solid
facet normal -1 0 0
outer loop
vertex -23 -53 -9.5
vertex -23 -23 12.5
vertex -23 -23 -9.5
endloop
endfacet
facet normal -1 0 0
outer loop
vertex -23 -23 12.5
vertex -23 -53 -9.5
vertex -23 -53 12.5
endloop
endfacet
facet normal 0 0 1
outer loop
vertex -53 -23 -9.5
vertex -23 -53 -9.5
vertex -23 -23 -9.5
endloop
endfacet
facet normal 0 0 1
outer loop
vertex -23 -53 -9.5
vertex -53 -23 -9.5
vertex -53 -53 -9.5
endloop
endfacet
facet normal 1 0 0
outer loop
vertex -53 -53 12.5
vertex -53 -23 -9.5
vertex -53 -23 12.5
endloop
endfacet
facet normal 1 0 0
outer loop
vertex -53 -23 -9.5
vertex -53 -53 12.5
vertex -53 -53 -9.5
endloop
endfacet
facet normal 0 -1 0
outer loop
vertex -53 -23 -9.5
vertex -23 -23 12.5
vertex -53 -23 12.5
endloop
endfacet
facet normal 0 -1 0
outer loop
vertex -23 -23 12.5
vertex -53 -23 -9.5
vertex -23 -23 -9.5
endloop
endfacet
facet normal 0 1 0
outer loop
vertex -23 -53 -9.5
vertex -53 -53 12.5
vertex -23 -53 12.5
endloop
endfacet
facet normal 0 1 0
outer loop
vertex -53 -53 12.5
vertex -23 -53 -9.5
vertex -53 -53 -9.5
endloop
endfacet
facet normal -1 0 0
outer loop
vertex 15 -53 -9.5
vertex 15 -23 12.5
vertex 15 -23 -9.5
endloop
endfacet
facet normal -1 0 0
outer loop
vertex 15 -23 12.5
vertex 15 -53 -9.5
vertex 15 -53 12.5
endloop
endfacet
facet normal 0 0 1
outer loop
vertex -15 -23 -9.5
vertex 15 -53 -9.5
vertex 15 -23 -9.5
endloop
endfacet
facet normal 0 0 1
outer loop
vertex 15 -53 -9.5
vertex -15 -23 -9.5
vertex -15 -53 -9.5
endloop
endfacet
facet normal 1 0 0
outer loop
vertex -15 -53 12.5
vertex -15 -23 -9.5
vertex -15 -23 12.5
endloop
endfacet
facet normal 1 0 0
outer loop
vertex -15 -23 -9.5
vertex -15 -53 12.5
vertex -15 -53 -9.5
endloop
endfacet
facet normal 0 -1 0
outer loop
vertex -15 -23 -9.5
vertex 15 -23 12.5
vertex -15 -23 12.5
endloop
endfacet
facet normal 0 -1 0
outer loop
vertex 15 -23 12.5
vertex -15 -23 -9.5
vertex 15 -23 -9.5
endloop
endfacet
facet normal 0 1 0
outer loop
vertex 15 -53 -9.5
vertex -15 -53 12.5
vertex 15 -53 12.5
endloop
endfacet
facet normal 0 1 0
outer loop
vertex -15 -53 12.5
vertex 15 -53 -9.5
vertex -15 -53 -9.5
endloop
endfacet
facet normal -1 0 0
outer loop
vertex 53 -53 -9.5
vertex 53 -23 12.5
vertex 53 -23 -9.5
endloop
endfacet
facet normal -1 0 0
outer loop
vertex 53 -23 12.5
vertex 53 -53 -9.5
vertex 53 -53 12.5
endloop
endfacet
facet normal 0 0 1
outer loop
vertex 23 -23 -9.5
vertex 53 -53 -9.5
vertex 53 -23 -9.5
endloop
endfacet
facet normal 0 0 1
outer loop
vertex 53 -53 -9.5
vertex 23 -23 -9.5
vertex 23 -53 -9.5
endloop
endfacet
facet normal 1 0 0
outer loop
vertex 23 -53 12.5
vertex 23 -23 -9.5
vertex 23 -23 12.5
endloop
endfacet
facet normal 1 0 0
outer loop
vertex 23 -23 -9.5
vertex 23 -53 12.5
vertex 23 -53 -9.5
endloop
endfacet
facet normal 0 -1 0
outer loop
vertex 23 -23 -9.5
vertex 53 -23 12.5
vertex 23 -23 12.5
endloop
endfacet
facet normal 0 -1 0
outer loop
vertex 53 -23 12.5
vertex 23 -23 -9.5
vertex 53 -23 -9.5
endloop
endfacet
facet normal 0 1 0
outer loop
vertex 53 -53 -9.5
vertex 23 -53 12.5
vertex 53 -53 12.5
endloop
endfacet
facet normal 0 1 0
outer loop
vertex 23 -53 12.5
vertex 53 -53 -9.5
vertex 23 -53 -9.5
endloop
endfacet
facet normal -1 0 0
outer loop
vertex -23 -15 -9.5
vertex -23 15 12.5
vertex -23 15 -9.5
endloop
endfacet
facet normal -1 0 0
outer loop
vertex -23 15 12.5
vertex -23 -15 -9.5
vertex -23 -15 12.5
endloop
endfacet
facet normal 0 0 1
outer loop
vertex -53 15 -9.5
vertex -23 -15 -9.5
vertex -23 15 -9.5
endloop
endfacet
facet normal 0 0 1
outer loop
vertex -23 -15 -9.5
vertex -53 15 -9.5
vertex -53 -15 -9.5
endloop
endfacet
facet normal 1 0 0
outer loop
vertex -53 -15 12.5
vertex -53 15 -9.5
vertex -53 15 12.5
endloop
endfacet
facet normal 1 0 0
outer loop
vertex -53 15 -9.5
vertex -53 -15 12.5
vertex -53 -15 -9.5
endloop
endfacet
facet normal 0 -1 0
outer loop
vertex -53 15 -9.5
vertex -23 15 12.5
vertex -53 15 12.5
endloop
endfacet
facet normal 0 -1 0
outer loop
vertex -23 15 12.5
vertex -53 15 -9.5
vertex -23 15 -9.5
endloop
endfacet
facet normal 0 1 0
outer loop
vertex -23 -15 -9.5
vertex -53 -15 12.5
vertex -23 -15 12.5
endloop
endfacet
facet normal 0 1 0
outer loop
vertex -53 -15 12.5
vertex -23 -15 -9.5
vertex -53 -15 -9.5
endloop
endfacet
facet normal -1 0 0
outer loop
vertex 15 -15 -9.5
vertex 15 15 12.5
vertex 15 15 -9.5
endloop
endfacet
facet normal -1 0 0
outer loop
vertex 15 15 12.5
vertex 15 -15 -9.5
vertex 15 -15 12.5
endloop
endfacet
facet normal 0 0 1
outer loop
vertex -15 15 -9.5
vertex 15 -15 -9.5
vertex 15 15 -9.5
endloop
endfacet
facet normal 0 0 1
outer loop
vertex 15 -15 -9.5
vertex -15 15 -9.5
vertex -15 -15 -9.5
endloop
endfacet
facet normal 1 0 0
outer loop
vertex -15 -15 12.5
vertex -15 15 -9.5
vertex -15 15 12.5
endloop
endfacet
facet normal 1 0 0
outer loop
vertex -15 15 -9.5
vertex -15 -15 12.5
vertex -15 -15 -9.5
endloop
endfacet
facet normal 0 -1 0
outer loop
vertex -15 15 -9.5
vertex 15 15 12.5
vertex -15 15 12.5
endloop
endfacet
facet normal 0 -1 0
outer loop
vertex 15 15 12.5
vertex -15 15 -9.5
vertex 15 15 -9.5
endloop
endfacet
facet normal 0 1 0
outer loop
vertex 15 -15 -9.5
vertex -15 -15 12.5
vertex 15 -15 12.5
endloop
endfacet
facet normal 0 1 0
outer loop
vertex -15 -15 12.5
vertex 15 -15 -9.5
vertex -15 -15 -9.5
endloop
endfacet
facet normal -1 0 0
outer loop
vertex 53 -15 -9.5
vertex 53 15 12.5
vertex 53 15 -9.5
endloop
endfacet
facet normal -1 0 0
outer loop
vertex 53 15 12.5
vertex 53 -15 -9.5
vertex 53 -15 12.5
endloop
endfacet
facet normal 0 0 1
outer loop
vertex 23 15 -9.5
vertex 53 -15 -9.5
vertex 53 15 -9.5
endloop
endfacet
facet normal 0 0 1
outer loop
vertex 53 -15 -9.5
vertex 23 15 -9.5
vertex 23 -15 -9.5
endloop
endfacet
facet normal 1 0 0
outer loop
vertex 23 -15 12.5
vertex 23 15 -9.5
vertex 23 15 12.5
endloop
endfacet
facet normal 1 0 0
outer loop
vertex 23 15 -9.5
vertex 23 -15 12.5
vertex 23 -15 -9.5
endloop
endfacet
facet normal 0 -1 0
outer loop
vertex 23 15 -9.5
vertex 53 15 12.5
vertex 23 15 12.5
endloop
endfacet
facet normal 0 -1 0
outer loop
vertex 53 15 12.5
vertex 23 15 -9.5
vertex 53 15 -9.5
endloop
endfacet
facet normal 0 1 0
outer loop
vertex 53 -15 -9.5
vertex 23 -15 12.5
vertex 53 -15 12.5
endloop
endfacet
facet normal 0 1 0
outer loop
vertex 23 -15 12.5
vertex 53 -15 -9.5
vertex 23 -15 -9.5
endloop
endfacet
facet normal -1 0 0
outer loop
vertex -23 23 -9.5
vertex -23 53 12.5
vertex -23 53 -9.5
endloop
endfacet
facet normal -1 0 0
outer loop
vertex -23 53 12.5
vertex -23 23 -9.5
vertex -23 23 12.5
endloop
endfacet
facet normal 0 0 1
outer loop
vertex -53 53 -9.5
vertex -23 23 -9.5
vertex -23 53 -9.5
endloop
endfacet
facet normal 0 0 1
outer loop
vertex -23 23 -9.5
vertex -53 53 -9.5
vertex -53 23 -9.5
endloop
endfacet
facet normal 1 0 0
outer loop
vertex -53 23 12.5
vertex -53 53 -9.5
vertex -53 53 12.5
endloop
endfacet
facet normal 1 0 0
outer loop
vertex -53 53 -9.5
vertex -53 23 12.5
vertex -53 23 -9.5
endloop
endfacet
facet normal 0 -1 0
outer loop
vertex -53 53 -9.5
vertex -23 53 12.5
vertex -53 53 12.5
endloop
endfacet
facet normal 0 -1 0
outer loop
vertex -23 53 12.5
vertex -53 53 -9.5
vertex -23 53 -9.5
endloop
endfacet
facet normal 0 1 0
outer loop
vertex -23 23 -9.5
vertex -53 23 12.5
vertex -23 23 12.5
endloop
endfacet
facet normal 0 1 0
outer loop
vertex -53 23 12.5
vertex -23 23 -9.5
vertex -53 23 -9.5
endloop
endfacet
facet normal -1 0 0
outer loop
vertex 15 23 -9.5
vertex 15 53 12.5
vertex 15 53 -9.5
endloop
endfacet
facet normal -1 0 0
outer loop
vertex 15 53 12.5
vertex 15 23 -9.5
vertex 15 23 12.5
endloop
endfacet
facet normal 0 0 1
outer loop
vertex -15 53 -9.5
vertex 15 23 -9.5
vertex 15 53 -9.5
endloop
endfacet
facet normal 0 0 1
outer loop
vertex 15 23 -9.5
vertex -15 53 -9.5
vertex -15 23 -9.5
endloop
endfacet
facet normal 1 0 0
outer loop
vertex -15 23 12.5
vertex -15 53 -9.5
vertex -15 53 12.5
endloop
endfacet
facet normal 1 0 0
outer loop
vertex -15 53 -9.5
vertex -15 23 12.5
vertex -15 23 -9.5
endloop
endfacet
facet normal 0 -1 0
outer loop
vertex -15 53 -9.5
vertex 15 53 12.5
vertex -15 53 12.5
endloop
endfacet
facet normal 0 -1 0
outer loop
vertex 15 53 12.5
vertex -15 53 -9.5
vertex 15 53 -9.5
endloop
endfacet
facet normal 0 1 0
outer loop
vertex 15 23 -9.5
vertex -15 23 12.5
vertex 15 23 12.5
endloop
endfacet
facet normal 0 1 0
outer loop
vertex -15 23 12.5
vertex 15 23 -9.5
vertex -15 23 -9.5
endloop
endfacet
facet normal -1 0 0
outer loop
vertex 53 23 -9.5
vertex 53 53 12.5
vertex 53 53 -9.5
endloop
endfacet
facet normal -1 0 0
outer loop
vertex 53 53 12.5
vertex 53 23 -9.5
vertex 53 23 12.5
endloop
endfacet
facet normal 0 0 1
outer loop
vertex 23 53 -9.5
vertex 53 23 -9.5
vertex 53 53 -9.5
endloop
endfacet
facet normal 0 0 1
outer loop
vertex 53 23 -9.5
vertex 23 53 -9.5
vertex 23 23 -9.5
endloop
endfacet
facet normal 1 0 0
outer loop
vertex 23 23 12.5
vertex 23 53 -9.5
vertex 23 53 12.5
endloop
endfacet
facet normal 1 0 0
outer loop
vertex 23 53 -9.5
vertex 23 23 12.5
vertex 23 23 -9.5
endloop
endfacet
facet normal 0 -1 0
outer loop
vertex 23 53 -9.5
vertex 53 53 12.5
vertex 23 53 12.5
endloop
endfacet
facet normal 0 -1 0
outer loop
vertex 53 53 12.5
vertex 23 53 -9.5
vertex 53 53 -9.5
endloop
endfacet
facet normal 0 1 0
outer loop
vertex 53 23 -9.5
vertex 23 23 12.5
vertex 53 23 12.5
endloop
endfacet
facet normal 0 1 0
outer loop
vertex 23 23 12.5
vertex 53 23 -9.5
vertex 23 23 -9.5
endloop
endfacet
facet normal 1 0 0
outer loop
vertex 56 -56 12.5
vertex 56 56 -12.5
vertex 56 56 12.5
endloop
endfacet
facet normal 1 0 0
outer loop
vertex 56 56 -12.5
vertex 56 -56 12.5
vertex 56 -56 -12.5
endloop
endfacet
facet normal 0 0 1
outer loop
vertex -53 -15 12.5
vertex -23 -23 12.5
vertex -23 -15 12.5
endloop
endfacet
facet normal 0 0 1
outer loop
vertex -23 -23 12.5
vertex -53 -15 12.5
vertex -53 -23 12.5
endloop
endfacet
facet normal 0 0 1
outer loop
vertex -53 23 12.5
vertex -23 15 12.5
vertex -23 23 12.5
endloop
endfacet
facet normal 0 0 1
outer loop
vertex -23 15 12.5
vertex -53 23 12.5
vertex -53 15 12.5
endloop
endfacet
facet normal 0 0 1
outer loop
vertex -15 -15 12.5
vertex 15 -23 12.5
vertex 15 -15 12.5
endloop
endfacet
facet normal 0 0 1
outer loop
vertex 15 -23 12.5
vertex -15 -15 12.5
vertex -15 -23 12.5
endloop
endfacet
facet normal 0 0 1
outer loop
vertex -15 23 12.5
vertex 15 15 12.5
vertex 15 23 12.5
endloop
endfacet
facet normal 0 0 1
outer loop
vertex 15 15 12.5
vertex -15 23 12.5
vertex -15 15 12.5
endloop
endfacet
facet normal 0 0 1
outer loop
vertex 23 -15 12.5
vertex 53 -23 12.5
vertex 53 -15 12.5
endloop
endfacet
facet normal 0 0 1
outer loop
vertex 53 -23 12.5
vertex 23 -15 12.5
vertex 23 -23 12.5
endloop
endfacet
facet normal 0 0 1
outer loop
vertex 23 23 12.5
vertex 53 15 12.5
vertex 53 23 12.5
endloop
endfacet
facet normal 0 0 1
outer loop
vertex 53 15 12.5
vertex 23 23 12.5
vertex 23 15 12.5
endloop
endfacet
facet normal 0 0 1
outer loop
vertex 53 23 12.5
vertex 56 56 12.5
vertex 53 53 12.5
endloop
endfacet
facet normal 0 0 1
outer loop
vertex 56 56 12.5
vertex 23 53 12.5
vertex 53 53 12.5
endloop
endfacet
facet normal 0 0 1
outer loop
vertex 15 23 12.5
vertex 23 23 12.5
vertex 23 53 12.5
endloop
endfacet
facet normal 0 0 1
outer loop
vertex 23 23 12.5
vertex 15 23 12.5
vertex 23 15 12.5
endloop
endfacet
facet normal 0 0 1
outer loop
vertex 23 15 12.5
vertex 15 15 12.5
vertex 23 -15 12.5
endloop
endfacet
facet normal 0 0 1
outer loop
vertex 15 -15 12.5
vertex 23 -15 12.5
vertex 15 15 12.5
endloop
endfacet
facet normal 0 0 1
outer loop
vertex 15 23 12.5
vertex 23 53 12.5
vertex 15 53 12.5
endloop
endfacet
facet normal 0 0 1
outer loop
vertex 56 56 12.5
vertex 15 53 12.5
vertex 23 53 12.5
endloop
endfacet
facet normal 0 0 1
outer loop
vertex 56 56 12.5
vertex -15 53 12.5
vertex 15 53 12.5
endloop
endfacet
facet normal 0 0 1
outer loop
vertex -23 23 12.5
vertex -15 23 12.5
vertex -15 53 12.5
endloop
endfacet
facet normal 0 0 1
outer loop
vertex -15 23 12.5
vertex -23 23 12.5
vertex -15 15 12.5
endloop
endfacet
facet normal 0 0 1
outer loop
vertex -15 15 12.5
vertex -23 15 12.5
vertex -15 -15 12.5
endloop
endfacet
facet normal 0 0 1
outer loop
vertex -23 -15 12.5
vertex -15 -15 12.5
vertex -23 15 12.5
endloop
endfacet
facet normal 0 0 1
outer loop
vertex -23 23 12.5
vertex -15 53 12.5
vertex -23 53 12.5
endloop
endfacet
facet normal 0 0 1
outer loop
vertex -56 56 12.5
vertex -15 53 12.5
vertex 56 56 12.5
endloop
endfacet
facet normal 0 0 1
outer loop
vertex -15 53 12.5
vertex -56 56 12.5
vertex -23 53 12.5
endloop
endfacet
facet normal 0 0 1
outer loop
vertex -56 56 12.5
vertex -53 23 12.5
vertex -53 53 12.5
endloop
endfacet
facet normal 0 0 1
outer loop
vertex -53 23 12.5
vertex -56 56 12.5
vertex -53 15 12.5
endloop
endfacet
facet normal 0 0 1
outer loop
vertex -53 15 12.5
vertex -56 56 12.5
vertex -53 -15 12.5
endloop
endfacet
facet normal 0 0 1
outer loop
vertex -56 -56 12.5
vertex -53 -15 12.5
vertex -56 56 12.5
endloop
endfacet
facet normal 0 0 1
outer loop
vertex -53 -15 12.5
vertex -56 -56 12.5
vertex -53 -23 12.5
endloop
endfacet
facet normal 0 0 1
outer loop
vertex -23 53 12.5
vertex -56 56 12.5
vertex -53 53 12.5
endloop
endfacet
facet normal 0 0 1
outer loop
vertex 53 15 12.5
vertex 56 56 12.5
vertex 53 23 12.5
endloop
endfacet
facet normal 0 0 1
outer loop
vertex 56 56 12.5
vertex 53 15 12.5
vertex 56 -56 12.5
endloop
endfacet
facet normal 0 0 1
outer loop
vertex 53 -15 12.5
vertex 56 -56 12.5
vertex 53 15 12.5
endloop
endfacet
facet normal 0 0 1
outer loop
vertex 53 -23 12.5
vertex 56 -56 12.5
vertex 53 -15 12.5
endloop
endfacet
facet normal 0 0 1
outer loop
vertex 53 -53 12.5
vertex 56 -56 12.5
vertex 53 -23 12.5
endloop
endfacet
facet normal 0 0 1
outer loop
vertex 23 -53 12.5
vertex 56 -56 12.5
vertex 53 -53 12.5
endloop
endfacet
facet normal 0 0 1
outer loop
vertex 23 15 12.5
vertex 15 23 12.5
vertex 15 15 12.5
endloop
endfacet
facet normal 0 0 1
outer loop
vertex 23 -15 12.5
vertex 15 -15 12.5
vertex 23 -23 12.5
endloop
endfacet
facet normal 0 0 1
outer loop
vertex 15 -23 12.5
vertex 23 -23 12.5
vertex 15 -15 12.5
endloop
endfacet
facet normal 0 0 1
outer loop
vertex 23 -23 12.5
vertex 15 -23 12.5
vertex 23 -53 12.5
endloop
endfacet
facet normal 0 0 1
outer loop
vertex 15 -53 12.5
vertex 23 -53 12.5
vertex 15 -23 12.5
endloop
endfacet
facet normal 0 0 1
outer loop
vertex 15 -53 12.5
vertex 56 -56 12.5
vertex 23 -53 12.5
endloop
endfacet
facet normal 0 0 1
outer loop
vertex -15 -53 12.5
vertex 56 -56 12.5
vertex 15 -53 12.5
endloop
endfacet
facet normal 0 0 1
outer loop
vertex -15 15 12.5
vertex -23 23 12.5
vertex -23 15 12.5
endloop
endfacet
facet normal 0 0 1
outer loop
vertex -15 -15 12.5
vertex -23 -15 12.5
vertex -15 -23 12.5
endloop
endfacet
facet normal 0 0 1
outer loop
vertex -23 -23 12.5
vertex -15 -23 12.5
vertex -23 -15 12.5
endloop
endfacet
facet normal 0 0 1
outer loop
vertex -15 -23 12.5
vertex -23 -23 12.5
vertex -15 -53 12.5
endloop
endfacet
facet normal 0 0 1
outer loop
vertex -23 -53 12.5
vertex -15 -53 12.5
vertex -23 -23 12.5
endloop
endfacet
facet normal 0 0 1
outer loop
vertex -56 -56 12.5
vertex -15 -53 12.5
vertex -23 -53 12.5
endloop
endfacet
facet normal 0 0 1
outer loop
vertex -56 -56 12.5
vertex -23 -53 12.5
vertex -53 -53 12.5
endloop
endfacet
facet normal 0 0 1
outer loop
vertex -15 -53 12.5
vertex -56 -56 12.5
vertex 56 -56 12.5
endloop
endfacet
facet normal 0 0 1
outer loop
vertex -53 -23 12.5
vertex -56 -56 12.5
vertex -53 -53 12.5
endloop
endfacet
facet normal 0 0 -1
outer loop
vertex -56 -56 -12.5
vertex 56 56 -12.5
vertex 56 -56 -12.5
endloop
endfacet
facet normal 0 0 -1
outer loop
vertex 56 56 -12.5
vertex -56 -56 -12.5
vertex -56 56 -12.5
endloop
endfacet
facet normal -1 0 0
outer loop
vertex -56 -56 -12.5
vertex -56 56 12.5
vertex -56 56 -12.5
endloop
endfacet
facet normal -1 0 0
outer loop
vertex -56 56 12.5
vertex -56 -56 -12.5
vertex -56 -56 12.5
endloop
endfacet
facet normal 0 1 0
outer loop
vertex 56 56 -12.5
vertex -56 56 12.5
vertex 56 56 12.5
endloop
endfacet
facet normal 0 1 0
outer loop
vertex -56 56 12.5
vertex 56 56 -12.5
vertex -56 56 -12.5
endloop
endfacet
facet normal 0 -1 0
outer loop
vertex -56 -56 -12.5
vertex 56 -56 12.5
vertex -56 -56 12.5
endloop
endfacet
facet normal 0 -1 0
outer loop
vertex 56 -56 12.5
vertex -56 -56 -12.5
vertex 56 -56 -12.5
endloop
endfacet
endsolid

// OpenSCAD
$fn = 32;

// ----------------------------------------------------------------------
// Pocket plate 112 x 112 x 25
// 3 x 3 pockets 30 mm square, 22 mm deep
// ----------------------------------------------------------------------

// --- parameters (mm) ---
thickness = 25;  // plate thickness
floor_t = 3;     // material left under each pocket
pocket = 30;     // pocket side length
pitch_x = 38;    // pocket pitch along X
pitch_y = 38;    // pocket pitch along Y
cols = 3;        // pockets per row
rows = 3;        // rows of pockets

// --- derived feature positions (mm) ---
depth = thickness - floor_t;        // = 22   pocket depth, down to the floor
span_x = (cols - 1) * pitch_x;      // = 76   distance between outer pockets
span_y = (rows - 1) * pitch_y;      // = 76   distance between outer pocket rows
origin_x = -span_x / 2;             // = -38   X of the first pocket
origin_y = -span_y / 2;             // = -38   Y of the first pocket
plate = [span_x + pocket + 6, span_y + pocket + 6, thickness];  // = [112, 112, 25]   overall size: pockets plus 3 mm of wall on each side
feature_centers = [
  [origin_x + 0 * pitch_x, origin_y + 0 * pitch_y],
  [origin_x + 1 * pitch_x, origin_y + 0 * pitch_y],
  [origin_x + 2 * pitch_x, origin_y + 0 * pitch_y],
  [origin_x + 0 * pitch_x, origin_y + 1 * pitch_y],
  [origin_x + 1 * pitch_x, origin_y + 1 * pitch_y],
  [origin_x + 2 * pitch_x, origin_y + 1 * pitch_y],
  [origin_x + 0 * pitch_x, origin_y + 2 * pitch_y],
  [origin_x + 1 * pitch_x, origin_y + 2 * pitch_y],
  [origin_x + 2 * pitch_x, origin_y + 2 * pitch_y]
];   // pocket centres, used verbatim by the cutter loop

// plate outline, then one pocket per centre in feature_centers
difference() {
  cube(plate, center = true);
  for (centre = feature_centers)
    translate([centre[0] - pocket / 2, centre[1] - pocket / 2, plate[2] / 2 - depth])
      cube([pocket, pocket, depth + 1]);  // centred on the declared pocket centre
}
